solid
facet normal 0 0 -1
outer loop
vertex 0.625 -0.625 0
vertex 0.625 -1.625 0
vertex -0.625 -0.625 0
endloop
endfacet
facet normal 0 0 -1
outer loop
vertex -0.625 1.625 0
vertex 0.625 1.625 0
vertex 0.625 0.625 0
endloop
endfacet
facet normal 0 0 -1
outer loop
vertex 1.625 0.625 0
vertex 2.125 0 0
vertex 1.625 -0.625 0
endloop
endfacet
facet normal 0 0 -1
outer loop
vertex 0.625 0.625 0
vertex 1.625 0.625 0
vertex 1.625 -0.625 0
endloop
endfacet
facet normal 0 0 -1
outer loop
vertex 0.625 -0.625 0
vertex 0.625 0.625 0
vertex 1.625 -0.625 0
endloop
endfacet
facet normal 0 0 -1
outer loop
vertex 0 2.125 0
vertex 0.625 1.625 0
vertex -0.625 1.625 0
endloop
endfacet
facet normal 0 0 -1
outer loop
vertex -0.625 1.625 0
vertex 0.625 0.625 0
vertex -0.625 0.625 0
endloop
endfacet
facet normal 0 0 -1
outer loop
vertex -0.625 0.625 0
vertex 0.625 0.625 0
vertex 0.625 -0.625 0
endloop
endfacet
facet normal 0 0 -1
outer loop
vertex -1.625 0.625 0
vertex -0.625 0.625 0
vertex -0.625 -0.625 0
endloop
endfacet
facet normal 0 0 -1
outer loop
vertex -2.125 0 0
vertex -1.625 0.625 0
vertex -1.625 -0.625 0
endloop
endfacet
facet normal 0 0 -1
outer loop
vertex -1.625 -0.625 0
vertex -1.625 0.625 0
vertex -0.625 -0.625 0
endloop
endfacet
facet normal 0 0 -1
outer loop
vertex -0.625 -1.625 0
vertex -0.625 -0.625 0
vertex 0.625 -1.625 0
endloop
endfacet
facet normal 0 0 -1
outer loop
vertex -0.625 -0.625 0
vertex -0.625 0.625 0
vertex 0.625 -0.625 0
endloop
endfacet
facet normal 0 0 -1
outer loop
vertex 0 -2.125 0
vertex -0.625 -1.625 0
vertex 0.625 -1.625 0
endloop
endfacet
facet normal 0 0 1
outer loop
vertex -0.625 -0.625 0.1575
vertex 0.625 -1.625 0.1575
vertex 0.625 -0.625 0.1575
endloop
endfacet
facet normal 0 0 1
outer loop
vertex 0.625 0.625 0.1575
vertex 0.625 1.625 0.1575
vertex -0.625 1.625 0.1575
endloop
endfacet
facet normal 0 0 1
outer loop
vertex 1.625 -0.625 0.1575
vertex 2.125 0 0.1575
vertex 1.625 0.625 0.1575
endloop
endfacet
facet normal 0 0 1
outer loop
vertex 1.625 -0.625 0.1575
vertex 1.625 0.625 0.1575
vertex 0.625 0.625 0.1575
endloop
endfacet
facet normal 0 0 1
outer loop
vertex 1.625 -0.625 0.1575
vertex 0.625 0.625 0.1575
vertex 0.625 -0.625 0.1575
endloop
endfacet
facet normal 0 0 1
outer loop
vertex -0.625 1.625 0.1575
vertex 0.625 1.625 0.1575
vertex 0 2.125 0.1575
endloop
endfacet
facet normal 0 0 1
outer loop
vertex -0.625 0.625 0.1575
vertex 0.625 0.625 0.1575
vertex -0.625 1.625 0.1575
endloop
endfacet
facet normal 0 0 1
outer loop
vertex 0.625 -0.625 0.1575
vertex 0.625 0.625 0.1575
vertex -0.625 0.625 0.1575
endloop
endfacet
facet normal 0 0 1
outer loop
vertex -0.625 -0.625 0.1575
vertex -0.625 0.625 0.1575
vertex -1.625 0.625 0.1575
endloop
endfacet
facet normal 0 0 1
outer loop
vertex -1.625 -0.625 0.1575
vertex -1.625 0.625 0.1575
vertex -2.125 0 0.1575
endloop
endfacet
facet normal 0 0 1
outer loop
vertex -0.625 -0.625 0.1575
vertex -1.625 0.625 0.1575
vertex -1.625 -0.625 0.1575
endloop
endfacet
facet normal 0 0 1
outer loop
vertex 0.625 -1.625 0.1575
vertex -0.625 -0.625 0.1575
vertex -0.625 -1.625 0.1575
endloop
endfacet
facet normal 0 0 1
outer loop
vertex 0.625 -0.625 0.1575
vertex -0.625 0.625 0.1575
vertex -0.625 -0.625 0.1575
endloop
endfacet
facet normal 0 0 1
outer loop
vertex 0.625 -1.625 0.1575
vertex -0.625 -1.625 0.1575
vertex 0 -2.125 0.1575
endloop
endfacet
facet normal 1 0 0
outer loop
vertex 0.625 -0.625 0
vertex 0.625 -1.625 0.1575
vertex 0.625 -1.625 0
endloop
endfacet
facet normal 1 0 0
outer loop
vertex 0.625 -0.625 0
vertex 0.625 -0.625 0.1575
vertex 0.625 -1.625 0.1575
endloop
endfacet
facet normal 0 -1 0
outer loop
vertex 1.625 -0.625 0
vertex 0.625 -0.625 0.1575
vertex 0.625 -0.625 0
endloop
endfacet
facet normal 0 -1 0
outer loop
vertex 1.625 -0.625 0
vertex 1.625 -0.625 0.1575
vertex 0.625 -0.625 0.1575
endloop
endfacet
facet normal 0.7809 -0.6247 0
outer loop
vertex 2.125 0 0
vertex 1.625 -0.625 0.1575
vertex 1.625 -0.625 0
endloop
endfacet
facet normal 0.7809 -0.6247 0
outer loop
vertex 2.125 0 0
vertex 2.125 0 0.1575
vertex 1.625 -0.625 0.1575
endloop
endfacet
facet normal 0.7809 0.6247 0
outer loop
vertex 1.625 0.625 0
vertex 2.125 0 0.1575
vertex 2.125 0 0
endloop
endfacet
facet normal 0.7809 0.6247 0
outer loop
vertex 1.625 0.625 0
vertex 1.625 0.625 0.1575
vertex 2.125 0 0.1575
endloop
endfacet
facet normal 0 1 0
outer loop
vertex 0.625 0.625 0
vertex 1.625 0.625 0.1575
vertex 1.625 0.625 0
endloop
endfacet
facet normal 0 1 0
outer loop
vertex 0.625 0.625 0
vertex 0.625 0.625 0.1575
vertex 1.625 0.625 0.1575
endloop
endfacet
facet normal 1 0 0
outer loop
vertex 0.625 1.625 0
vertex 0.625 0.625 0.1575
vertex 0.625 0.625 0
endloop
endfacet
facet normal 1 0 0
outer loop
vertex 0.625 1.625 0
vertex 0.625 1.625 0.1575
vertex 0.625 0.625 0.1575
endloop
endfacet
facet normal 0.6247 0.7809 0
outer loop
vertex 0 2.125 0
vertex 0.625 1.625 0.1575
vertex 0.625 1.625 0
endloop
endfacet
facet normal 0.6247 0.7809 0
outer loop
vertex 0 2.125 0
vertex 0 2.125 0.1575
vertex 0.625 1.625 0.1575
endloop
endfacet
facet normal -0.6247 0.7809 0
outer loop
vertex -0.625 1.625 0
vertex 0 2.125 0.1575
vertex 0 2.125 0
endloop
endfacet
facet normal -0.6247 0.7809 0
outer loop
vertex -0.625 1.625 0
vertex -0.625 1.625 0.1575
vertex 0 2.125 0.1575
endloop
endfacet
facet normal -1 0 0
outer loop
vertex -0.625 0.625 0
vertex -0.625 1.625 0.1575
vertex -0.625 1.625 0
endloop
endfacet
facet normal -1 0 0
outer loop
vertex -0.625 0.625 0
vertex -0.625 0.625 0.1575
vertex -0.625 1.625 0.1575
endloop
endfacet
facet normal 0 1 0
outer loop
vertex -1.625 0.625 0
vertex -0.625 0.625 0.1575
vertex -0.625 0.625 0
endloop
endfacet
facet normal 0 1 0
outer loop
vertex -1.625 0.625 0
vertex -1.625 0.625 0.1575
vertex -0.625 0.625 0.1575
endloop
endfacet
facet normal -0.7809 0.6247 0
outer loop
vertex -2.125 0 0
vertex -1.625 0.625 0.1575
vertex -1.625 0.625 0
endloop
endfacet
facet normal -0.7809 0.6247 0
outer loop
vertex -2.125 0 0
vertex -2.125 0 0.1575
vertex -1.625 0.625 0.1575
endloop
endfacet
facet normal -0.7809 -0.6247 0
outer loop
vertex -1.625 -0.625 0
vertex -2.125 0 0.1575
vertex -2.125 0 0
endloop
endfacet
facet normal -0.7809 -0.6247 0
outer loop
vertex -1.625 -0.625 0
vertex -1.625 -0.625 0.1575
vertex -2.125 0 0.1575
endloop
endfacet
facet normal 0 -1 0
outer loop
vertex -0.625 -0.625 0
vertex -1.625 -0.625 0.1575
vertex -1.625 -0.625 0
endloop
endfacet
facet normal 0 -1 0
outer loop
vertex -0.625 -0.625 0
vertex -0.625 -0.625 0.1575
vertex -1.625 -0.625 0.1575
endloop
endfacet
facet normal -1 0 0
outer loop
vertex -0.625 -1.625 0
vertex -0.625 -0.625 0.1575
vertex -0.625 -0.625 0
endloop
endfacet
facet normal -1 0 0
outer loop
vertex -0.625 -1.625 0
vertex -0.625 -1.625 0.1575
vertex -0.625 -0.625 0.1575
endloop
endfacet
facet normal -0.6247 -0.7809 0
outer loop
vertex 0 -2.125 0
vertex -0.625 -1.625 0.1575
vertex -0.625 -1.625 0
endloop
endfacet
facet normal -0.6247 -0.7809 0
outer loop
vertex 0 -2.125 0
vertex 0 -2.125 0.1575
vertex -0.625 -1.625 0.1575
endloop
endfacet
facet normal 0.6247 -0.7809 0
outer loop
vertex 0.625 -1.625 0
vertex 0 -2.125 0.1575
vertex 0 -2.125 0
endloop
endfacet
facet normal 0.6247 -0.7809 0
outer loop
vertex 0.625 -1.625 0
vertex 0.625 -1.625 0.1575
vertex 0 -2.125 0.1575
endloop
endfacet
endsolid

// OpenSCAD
T=1.25;
T2=T/2;

module three() {
    linear_extrude(height=4/25.4) polygon([
      [ -1, 0], [-1.5, T2], [-1, 1.25], [-T2, 1.25],
      [-T2, 1.25 + 1], [0, 1.25 + 1.5], [T2, 1.25+1],
      [T2, 1.25], [1, 1.25], [1.5, T2], [1, 0]
    ]);
}

module four() {
    linear_extrude(height=4/25.4) polygon([
        [-T2, -T2], [-1, -T2], [-1.5, 0], [-1, T2], [-T2, T2],
        [-T2, 1], [0, 1.5], [T2, 1], [T2, T2],
        [1, T2], [1.5, 0], [1, -T2], [T2, -T2],
        [T2, -1], [0, -1.5], [-T2, -1], [-T2, -T2]
    ]);
}

module four2() {
    e=1;
    T2e=T2 + e;
    T2ee=T2 + 1.5*e;
    linear_extrude(height=4/25.4) polygon([
        [-T2, -T2], [-T2e, -T2], [-T2ee, 0], [-T2e, T2], [-T2, T2],
        [-T2, T2e], [0, T2ee], [T2, T2e], [T2, T2],
        [T2e, T2], [T2ee, 0], [T2e, -T2], [T2, -T2],
        [T2, -T2e], [0, -T2ee], [-T2, -T2e], [-T2, -T2]
    ]);
}

four2();
